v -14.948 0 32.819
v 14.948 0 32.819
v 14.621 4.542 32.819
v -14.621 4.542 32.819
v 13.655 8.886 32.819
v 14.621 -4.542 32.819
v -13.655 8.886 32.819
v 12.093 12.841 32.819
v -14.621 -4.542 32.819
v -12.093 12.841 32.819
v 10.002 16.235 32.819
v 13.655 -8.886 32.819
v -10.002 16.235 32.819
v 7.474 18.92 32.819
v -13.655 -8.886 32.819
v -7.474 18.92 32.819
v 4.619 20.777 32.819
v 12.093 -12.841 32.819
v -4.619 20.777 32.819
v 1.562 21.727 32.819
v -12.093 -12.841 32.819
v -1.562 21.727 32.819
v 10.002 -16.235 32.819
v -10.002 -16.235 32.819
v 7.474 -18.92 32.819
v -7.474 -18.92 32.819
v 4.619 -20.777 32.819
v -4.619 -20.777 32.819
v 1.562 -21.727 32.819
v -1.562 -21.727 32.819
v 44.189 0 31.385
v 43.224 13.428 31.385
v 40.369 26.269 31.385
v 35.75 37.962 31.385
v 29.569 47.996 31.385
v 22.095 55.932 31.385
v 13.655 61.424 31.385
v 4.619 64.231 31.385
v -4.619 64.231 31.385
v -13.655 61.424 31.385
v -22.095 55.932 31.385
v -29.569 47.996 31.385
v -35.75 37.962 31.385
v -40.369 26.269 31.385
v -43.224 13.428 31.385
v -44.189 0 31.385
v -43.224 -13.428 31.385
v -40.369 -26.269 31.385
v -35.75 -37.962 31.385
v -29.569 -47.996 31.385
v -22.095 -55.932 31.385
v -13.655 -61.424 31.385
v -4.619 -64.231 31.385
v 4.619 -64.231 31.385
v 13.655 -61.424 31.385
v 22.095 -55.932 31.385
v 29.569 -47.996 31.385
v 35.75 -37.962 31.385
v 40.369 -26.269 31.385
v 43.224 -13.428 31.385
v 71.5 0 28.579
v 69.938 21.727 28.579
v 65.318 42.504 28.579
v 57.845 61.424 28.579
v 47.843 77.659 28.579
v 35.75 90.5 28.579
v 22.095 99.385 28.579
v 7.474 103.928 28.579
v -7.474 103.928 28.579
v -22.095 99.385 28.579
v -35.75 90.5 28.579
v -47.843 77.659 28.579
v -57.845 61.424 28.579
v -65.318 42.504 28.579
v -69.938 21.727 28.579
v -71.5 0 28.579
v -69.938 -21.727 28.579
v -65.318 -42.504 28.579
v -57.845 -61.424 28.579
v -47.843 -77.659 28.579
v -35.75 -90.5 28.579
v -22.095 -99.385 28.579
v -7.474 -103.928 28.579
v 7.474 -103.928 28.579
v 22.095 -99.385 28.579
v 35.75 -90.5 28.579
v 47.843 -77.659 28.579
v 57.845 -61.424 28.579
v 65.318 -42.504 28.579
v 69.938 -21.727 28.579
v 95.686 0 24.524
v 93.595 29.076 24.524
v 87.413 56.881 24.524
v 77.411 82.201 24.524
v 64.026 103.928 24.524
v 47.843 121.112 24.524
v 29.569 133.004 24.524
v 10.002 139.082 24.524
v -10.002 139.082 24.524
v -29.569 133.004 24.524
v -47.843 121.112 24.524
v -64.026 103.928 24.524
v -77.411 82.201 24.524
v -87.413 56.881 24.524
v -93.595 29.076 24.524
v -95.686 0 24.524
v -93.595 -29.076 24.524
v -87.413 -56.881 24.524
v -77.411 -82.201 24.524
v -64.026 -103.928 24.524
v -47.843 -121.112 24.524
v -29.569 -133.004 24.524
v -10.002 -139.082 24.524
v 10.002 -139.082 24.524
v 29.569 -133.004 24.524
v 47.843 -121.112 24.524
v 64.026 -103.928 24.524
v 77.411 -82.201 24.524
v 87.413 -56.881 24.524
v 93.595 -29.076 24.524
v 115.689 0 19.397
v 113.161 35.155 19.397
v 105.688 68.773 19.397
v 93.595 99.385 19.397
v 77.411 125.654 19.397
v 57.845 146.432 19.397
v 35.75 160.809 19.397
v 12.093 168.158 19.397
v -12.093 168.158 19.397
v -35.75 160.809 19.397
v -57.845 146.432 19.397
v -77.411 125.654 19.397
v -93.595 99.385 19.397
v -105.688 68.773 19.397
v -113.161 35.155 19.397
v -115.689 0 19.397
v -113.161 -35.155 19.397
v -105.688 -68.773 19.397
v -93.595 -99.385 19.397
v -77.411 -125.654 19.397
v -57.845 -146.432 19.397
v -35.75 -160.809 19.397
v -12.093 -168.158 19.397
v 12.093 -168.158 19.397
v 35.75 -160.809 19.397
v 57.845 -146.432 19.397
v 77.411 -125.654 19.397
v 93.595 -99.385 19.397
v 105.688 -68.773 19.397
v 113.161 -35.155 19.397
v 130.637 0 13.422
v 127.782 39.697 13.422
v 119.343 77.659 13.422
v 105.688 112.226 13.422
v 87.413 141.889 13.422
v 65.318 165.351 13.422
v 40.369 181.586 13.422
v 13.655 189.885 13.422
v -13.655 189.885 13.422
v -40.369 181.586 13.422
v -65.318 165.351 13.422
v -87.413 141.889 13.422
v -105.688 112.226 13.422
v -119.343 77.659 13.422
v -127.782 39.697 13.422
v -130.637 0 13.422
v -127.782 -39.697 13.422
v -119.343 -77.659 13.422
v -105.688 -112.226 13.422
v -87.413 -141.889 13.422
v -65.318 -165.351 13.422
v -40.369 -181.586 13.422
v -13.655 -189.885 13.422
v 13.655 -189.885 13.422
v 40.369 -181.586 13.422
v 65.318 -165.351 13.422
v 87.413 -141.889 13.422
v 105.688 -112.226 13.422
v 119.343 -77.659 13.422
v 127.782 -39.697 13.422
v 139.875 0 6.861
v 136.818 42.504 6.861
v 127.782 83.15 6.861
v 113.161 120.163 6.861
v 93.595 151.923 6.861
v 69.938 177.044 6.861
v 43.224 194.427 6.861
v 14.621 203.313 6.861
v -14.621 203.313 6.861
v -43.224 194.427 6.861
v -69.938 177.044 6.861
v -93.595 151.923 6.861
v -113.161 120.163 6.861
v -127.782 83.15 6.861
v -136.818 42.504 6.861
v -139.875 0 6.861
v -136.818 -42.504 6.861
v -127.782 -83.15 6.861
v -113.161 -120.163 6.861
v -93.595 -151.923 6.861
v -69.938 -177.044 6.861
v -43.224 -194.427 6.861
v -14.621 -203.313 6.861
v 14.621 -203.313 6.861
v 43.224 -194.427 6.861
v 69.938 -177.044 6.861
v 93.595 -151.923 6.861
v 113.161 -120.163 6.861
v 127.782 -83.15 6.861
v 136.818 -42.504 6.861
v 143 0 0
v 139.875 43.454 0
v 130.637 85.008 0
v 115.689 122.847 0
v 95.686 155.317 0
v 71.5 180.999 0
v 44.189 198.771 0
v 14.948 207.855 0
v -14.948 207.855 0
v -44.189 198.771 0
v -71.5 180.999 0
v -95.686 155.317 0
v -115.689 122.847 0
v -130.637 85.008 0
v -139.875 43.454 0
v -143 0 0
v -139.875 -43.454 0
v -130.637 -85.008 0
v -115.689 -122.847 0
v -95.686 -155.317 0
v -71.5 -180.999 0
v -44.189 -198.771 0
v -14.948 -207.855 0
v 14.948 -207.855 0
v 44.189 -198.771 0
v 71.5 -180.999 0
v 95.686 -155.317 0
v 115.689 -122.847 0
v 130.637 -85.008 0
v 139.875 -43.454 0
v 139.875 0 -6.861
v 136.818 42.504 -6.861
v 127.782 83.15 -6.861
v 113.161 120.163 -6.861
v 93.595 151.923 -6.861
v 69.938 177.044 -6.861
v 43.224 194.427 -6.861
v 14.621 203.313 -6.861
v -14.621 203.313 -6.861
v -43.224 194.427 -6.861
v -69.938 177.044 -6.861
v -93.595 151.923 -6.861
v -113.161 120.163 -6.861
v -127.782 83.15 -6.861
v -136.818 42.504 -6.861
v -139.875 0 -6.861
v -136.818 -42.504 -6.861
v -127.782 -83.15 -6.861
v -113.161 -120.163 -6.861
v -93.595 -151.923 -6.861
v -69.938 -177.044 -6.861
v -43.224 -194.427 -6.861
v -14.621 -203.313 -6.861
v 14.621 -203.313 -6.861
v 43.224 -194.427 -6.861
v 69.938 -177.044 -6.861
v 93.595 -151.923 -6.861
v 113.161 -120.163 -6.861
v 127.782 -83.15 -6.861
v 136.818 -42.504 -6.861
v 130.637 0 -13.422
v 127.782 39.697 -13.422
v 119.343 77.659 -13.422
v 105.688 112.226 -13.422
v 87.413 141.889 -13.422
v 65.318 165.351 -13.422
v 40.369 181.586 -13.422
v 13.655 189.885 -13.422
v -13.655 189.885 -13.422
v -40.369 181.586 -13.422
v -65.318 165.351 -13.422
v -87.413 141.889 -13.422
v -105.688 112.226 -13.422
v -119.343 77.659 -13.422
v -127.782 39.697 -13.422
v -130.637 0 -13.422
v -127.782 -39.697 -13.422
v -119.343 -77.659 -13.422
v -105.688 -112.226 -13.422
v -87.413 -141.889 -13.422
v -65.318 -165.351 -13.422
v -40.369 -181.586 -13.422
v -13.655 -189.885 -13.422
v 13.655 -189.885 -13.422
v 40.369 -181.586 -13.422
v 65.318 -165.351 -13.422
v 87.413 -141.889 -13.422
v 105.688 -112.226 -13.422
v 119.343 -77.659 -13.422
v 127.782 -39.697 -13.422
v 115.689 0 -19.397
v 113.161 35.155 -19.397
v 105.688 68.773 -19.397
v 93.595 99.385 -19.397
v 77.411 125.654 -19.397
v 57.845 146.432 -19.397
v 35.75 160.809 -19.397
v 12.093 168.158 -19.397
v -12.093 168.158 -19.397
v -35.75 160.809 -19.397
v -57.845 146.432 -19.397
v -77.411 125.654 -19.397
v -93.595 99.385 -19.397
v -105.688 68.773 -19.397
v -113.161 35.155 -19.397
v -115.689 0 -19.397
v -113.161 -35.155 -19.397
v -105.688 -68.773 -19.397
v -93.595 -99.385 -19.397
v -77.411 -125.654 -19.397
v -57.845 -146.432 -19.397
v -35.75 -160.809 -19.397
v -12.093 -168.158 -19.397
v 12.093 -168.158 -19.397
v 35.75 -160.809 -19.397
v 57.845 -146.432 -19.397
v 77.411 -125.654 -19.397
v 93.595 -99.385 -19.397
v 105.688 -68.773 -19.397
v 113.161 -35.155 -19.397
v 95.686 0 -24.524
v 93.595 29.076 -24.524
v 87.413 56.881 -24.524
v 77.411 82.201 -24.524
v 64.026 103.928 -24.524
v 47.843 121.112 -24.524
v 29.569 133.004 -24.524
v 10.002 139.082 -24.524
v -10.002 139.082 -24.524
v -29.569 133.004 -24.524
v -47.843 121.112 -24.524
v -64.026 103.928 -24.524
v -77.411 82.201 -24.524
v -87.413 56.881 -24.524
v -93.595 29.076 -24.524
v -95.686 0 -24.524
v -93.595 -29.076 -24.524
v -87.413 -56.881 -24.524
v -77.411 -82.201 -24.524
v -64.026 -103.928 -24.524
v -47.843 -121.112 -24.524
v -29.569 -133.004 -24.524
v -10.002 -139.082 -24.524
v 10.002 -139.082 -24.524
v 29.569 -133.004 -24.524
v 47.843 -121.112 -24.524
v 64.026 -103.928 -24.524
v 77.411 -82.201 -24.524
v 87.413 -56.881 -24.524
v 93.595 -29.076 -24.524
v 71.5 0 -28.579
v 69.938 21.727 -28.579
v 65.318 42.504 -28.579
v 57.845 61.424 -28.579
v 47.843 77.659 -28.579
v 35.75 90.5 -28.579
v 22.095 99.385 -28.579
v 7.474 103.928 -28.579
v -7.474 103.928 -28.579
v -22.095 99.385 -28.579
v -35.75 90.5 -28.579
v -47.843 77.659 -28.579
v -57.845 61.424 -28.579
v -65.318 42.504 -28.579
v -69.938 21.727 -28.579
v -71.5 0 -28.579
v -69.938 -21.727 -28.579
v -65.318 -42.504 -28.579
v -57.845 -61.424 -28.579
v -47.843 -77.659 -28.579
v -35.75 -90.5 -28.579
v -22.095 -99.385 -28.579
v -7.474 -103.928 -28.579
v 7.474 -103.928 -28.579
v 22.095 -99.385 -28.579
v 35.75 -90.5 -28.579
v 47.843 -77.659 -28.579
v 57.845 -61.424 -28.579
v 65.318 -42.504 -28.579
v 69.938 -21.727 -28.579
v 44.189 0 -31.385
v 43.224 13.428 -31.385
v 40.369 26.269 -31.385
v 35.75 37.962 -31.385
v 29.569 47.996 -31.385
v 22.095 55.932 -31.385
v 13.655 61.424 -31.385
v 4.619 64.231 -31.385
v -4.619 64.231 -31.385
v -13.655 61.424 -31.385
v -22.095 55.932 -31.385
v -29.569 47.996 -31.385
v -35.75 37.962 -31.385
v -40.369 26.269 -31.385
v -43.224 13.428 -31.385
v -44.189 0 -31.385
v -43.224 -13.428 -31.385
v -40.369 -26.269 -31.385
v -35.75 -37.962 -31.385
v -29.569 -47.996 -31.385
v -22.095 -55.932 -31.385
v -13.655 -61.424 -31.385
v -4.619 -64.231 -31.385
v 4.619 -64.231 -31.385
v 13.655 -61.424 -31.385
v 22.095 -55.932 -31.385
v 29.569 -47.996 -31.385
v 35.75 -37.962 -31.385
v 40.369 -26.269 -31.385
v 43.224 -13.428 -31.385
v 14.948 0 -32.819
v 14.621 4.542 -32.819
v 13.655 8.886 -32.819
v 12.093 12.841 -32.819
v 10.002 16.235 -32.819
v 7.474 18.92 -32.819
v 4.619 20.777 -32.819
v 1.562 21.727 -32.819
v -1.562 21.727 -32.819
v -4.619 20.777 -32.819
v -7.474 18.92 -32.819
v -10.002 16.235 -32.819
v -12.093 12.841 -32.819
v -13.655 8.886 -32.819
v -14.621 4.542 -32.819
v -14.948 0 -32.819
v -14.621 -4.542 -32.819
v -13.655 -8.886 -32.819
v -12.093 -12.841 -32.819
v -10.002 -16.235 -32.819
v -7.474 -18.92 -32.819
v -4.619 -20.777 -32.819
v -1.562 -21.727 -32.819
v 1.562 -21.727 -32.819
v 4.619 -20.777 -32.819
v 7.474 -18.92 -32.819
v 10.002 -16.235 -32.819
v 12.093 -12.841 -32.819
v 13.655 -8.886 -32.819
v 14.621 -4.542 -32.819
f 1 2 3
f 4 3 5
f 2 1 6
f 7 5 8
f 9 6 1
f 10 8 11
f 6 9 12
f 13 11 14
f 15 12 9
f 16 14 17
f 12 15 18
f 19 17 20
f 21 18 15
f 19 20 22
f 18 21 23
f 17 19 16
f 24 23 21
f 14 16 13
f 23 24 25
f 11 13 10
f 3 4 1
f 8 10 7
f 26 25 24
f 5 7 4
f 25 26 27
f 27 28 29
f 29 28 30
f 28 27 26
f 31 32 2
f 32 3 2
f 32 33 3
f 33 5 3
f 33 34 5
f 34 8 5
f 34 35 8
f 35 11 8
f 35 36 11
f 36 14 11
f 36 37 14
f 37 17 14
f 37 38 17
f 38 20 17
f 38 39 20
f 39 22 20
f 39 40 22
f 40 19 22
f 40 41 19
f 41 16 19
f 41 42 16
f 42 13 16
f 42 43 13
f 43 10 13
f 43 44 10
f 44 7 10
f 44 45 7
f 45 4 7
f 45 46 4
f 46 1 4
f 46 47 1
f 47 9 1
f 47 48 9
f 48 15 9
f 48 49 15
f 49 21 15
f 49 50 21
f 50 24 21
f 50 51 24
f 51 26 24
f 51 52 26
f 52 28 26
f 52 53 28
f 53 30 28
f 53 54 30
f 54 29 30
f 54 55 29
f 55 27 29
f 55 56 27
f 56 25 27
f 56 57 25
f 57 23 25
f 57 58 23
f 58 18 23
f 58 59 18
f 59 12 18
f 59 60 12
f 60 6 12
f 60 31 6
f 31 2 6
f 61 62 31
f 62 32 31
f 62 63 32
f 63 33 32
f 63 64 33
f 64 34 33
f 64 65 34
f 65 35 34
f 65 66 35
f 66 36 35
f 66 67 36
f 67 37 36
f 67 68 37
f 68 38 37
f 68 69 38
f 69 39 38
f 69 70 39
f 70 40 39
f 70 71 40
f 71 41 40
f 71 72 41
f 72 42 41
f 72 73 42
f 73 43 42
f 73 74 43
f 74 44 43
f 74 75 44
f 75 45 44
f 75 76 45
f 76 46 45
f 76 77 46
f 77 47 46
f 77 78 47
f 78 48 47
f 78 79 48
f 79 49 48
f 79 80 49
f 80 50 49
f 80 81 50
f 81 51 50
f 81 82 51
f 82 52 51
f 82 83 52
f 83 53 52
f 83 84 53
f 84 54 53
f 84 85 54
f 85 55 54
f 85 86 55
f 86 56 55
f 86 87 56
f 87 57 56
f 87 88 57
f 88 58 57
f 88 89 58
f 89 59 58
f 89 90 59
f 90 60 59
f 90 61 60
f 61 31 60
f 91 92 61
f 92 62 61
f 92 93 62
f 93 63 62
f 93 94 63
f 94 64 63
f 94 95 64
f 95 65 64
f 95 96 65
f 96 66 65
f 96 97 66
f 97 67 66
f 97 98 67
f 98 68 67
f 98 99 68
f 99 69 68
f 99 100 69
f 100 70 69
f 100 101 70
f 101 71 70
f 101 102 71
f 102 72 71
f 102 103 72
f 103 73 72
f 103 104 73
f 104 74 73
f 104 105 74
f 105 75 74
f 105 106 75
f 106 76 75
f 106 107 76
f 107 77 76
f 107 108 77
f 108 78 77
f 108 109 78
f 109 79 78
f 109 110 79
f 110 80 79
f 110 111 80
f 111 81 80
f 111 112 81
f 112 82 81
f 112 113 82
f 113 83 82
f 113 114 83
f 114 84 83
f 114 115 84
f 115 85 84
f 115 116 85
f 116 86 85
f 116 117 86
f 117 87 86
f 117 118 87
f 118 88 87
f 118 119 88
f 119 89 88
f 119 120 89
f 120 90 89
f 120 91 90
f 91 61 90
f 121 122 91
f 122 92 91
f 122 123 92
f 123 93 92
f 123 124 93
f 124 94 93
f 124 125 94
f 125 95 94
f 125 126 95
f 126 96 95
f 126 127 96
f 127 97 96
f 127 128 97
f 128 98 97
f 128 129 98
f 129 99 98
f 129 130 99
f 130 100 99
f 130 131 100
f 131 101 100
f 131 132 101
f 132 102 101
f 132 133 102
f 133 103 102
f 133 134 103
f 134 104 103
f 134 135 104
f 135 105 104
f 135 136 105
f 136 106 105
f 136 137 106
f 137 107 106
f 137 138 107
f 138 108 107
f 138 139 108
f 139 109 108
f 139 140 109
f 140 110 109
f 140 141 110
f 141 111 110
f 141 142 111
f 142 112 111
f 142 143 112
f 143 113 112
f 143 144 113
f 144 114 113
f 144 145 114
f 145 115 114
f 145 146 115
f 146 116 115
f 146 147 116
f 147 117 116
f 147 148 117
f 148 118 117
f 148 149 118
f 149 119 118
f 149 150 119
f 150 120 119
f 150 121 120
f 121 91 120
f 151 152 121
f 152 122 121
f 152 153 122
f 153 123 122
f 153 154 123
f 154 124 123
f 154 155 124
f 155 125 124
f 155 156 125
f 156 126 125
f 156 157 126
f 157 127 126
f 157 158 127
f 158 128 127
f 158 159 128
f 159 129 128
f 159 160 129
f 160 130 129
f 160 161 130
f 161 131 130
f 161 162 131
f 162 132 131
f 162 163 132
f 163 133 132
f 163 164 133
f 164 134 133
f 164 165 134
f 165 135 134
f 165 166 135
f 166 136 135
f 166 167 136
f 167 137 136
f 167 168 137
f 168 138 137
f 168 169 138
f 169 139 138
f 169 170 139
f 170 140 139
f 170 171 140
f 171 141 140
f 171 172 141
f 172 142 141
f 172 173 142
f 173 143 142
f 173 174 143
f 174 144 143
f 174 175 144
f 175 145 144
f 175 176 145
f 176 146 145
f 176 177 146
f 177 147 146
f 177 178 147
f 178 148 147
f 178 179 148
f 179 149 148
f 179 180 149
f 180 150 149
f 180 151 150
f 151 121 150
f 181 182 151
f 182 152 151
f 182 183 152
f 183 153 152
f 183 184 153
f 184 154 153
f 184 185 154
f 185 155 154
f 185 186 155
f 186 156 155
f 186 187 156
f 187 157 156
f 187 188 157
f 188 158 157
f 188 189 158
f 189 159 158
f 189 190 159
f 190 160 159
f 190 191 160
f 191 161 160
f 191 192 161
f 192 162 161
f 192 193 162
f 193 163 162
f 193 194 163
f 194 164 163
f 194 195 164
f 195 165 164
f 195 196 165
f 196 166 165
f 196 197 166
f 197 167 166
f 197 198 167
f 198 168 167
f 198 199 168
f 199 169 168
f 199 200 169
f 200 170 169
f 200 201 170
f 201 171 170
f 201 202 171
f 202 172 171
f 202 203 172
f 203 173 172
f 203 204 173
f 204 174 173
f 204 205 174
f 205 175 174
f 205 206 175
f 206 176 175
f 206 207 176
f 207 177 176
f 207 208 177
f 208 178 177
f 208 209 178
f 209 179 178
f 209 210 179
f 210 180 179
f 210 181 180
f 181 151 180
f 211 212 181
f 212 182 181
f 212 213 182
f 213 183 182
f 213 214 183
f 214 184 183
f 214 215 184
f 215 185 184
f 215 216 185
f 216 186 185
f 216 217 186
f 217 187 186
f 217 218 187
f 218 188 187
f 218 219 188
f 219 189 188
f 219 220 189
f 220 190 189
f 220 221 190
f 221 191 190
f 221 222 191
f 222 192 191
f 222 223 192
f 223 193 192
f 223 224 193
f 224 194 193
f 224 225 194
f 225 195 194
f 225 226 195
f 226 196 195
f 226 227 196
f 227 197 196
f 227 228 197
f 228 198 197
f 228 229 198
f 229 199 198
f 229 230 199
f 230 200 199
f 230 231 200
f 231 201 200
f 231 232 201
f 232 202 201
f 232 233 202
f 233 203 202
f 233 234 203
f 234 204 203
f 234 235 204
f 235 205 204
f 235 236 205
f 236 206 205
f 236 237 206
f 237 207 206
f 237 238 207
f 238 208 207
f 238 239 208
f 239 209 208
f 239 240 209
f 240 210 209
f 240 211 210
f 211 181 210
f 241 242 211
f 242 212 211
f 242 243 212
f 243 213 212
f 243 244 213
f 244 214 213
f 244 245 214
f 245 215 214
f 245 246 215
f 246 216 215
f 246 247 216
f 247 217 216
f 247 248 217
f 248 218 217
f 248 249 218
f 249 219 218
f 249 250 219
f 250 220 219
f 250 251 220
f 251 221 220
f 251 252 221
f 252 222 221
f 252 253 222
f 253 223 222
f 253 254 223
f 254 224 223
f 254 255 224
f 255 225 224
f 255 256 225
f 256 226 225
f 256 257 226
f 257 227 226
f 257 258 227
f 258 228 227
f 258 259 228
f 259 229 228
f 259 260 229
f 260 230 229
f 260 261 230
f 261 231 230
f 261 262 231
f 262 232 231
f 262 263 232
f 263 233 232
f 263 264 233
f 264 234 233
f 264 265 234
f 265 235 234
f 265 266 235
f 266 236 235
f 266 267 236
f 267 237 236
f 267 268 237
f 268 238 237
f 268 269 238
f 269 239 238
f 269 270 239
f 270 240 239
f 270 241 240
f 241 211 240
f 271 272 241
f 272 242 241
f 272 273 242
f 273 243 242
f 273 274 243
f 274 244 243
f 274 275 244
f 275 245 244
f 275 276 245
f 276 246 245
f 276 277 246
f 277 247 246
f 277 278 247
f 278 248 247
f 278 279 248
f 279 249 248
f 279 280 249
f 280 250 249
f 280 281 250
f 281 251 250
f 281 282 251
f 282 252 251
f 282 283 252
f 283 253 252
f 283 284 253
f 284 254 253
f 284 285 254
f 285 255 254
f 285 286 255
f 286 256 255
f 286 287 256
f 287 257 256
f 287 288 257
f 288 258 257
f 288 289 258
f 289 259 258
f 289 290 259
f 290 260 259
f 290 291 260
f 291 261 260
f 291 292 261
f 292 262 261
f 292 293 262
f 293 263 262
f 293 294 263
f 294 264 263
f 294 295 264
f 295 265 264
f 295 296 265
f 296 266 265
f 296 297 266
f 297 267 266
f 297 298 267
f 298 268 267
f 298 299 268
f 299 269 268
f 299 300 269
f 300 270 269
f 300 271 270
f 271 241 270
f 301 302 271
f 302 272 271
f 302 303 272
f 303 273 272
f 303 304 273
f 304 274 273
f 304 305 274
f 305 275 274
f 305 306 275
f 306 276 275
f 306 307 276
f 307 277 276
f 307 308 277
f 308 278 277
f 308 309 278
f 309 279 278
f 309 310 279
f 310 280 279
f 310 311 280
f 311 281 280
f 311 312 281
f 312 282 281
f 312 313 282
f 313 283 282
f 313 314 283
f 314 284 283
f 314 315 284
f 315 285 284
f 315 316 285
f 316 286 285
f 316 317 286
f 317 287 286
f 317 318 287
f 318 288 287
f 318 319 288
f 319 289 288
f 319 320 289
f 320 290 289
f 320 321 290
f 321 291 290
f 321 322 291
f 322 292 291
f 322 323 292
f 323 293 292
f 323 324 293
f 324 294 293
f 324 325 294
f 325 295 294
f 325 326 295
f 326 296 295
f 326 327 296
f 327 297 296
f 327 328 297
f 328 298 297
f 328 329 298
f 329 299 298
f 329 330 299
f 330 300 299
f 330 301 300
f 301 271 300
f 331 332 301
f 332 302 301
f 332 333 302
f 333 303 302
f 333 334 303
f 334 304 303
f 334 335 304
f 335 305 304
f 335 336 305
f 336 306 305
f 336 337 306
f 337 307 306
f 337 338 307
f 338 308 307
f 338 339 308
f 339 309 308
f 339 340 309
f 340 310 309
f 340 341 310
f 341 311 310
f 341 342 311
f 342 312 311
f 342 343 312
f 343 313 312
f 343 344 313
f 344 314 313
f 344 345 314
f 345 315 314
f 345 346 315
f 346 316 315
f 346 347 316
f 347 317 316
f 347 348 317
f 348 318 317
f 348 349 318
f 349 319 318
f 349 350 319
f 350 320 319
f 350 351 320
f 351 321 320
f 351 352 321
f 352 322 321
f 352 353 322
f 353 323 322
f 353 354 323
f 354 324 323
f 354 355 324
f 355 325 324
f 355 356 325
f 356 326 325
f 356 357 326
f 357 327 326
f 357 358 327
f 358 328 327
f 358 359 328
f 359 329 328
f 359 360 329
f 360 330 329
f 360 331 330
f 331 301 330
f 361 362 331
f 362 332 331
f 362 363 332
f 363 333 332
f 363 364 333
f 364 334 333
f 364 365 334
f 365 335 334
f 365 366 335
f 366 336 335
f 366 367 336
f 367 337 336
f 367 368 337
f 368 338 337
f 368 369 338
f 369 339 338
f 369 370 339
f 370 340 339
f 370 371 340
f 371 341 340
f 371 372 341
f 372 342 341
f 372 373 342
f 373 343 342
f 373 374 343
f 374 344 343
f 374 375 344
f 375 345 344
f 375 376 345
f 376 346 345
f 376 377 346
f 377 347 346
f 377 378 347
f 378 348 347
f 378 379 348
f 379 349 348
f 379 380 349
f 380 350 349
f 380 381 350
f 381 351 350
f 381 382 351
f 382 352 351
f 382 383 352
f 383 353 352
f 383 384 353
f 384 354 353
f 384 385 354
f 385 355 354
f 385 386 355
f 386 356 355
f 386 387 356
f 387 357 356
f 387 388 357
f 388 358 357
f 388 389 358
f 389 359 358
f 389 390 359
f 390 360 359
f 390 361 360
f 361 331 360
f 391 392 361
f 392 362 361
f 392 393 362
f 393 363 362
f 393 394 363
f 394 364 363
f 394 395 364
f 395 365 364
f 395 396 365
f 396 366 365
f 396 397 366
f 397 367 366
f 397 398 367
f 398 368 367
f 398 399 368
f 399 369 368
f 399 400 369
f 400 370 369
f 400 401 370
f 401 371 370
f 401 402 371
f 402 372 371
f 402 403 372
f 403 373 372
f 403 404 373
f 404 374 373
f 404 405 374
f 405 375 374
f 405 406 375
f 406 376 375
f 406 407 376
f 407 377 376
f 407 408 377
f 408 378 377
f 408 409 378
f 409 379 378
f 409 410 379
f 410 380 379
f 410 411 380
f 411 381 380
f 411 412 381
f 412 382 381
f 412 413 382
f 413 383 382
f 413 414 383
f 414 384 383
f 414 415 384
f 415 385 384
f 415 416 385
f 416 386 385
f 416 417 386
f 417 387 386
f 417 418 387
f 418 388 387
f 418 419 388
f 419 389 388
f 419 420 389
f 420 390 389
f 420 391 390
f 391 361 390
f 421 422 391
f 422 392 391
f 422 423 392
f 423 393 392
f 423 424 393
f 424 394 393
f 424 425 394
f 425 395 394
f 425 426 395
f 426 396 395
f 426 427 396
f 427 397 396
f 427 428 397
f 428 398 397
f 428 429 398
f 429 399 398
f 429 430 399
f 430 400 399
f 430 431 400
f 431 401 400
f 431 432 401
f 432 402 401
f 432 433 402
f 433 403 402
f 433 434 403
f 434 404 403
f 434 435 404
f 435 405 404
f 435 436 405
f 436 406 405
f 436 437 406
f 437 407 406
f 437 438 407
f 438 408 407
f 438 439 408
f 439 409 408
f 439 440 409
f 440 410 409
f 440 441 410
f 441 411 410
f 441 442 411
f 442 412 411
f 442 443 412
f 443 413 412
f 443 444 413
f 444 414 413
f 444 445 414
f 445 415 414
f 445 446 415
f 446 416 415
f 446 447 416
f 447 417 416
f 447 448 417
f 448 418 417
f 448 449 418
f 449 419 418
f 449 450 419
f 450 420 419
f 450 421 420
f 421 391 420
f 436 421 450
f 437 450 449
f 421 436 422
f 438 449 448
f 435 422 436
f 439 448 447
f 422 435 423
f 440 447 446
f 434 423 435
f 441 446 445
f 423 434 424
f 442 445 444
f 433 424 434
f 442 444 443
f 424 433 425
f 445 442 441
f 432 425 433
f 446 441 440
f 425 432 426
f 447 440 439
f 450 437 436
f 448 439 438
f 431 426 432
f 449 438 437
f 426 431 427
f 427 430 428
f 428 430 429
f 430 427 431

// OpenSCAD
// Generated by SolidPython 1.0.1 on 2020-07-29 00:46:51


scale(v = [13, 19, 3]) {
	sphere(r = 11);
}
/***********************************************
*********      SolidPython code:      **********
************************************************
 
# import packages: SolidPython
from solid import *
from solid.utils import *
from itertools import chain, combinations, permutations


class Resize:

    def __init__(self, scad_file):
        self.scad_file = scad_file
        #self.scad_file = import_scad(scad_file)
        # cone/cylinder param:
        self.r1 = 0
        self.r2 = 0
        self.h = 0
        # rectangular prism param:
        self.w = 0
        self.l = 0
        # ellipse param:
        self.r = 0

    # import OpenScad code (file name corresponds to shape)


    # classify shape + parameters
    def assign(self, param1, param2, param3):
        if self.scad_file == 'cone.scad':
            self.r1 = param1
            self.r2 = param2
            self.h = param3
        elif self.scad_file == 'cylinder.scad':
            self.r1 = param1
            self.r2 = param2
            self.h = param3
        elif self.scad_file == 'rectangularPrism.scad':
            self.h = param1
            self.l = param2
            self.w = param3
        else:
            self.r = param1
            self.h = param2

    # resize parameters
    def iterate(self):
        x = range(3, 20, 2)
        i = 1
        if self.scad_file == 'cone.scad':
            tempList = list(permutations(x, 2))
            for temp in tempList:
                param1 = temp[0]
                param2 = temp[1]
                filepath = 'produced_scad_files/' + 'cone' + str(param1) + '_' + str(param2) + '_' + '.scad'
                scad_render_to_file(cylinder(h=param1, r1=param2, r2=0), filepath)

        elif self.scad_file == 'cylinder.scad':
            tempList = list(permutations(x, 3))
            for temp in tempList:
                param1 = temp[0]
                param2 = temp[1]
                filepath = 'produced_scad_files/' + 'cylinder' + str(param1) + '_' + str(param2) + '_' + '.scad'
                scad_render_to_file(cylinder(h=param1, r1=param2, r2=param2), filepath)

        elif self.scad_file == 'rectangularPrism.scad':
            tempList = list(permutations(x, 3))
            for temp in tempList:
                param1 = temp[0]
                param2 = temp[1]
                param3 = temp[2]
                filepath = 'produced_scad_files/' + 'rectangularPrism' + str(param1) + '_' + str(param2) + '_' + str(
                    param3) + '.scad'
                scad_render_to_file(cube(size=(param1, param2, param3)), filepath)

        elif self.scad_file == 'ellipse.scad':
            tempList = list(permutations(x, 4))
            for temp in tempList:
                param1 = temp[0]
                param2 = temp[1]
                param3 = temp[2]
                param4 = temp[3]
                filepath = 'produced_scad_files/' + 'ellipse' + str(param1) + '_' + str(param2) + '_' + str(param3) + '_' + str(param4) + '.scad'
                scad_render_to_file(scale([param1, param2, param3])(sphere(r=param4)), filepath)

    def render_to_scadfile(self):
        scad_render_to_file(scad, 'example.scad') 
 
************************************************/
